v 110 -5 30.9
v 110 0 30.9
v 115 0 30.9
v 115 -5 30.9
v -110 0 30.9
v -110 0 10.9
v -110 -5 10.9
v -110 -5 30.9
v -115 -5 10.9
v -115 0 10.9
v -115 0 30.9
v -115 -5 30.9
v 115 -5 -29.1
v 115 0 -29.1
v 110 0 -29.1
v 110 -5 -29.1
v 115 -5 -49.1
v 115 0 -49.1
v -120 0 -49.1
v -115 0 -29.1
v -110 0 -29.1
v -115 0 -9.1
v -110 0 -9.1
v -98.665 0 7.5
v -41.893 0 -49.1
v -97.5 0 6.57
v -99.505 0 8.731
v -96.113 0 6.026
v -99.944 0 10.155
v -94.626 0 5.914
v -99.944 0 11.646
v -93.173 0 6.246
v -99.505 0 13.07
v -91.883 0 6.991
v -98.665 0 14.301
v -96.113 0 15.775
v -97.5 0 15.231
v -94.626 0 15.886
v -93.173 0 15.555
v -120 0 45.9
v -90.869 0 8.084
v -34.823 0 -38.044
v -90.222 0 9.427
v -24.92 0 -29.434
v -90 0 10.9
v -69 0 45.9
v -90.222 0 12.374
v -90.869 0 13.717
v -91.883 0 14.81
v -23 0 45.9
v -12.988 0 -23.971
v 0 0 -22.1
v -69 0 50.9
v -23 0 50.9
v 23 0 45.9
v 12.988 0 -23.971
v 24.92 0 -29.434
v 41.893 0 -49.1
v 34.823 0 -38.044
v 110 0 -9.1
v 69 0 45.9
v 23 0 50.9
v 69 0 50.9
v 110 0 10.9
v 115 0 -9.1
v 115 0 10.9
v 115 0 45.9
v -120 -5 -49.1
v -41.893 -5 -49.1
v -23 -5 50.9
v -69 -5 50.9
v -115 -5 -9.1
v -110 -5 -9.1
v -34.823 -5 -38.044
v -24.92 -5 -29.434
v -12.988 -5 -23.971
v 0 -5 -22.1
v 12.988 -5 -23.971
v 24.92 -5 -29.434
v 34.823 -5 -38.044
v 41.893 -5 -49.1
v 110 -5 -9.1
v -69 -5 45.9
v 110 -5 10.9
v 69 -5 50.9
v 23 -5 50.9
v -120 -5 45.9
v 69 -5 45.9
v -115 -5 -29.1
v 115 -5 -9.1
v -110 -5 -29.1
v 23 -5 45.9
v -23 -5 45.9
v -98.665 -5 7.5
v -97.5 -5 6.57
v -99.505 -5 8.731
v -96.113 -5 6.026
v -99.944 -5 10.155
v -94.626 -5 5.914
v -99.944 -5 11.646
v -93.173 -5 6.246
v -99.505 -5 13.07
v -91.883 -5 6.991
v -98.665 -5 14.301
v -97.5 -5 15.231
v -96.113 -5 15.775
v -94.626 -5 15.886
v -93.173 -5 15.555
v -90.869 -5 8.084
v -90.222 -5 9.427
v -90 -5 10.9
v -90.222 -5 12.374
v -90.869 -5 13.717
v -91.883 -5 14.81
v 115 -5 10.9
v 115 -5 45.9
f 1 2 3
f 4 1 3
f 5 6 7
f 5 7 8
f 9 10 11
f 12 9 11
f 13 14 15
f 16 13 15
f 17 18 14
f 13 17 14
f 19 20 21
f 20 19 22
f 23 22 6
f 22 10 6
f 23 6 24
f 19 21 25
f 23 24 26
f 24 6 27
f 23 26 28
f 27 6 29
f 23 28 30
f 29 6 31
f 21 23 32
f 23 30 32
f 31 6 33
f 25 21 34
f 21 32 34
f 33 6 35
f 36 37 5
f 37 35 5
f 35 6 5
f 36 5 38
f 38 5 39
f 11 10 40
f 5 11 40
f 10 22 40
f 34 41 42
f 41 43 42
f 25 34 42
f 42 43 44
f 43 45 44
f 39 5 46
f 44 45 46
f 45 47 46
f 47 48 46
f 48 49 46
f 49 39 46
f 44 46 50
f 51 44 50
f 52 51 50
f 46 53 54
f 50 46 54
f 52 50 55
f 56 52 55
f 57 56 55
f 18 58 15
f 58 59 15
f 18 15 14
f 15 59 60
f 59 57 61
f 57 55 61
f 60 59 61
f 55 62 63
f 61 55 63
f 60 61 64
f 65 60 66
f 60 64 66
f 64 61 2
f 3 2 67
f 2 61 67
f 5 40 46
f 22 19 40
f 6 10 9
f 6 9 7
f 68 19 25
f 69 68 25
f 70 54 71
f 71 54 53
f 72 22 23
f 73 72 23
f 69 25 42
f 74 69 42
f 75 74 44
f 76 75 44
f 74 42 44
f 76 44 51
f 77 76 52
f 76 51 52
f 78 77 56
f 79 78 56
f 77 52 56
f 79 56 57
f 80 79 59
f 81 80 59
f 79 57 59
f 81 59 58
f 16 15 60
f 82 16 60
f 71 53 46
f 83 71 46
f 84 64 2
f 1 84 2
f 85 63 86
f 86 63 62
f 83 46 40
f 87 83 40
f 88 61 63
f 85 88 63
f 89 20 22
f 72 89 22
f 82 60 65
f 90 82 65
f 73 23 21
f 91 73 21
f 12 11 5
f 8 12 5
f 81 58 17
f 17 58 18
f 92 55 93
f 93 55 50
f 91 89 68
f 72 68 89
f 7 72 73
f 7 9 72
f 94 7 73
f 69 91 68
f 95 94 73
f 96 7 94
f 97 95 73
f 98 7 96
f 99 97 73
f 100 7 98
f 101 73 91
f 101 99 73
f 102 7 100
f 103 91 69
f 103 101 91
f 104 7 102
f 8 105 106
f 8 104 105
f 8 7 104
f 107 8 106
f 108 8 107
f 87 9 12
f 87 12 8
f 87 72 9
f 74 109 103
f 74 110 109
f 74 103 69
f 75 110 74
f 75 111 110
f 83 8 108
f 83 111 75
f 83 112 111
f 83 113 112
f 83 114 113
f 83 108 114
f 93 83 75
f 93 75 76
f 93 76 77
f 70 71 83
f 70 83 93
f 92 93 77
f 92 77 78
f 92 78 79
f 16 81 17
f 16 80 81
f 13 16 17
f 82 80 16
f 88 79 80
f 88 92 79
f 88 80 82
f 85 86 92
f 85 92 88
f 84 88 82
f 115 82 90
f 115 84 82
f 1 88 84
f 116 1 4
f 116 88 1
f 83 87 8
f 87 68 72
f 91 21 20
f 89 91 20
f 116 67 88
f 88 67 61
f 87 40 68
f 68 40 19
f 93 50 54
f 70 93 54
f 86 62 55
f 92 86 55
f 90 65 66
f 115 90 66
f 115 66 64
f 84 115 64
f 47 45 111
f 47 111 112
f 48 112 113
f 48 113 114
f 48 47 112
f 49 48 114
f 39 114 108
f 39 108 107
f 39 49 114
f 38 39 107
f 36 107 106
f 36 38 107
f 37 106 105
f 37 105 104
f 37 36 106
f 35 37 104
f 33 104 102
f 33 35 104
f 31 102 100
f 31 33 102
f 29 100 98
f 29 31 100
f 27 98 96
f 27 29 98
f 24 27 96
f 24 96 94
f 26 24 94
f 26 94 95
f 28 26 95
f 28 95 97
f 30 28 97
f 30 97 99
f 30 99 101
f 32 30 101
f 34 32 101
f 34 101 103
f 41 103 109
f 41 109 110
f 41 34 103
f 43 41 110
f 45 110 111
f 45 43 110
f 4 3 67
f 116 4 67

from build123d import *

# Parameters (mm, degrees)
F0_R     = 5
F0_W     = 5
F0_H     = 20
F1_DEPTH = 5


with BuildPart() as f1:
    # F0 (on Front) → F1 (new body)
    with BuildSketch(Plane.XZ):
        with BuildLine():
            Line((41.89272, -49.099528), (110, -49.099528))
            Line((110, -49.099528), (115, -49.099528))
            Line((115, -49.099528), (115, -29.099528))
            Line((115, -29.099528), (110, -29.099528))
            Line((110, -29.099528), (110, -9.099528))
            Line((110, -9.099528), (115, -9.099528))
            Line((115, -9.099528), (115, 10.900472))
            Line((115, 10.900472), (110, 10.900472))
            Line((110, 10.900472), (110, 30.900472))
            Line((110, 30.900472), (115, 30.900472))
            Line((115, 30.900472), (115, 45.900472))
            Line((115, 45.900472), (69, 45.900472))
            Line((69, 45.900472), (69, 50.900472))
            Line((69, 50.900472), (23, 50.900472))
            Line((23, 50.900472), (23, 45.900472))
            Line((23, 45.900472), (-23, 45.900472))
            Line((-23, 45.900472), (-23, 50.900472))
            Line((-23, 50.900472), (-69, 50.900472))
            Line((-69, 50.900472), (-69, 45.900472))
            Line((-69, 45.900472), (-115, 45.900472))
            Line((-115, 45.900472), (-120, 45.900472))
            Line((-120, 45.900472), (-120, -49.099528))
            Line((-120, -49.099528), (-115, -49.099528))
            Line((-115, -49.099528), (-110, -49.099528))
            Line((-110, -49.099528), (-41.89272, -49.099528))
            ThreePointArc((-41.89272, -49.099528), (0, -22.099528), (41.89272, -49.099528))
        make_face()
        Polygon((-110, -29.099528), (-115, -29.099528), (-115, -9.099528), (-110, -9.099528), (-110, -19.099528), align=None, mode=Mode.SUBTRACT)
        with Locations((-95, 10.900472)):
            Circle(F0_R, mode=Mode.SUBTRACT)
        with Locations((-112.5, 20.900472)):
            Rectangle(F0_W, F0_H, mode=Mode.SUBTRACT)
    extrude(amount=F1_DEPTH)


solid = f1.part
